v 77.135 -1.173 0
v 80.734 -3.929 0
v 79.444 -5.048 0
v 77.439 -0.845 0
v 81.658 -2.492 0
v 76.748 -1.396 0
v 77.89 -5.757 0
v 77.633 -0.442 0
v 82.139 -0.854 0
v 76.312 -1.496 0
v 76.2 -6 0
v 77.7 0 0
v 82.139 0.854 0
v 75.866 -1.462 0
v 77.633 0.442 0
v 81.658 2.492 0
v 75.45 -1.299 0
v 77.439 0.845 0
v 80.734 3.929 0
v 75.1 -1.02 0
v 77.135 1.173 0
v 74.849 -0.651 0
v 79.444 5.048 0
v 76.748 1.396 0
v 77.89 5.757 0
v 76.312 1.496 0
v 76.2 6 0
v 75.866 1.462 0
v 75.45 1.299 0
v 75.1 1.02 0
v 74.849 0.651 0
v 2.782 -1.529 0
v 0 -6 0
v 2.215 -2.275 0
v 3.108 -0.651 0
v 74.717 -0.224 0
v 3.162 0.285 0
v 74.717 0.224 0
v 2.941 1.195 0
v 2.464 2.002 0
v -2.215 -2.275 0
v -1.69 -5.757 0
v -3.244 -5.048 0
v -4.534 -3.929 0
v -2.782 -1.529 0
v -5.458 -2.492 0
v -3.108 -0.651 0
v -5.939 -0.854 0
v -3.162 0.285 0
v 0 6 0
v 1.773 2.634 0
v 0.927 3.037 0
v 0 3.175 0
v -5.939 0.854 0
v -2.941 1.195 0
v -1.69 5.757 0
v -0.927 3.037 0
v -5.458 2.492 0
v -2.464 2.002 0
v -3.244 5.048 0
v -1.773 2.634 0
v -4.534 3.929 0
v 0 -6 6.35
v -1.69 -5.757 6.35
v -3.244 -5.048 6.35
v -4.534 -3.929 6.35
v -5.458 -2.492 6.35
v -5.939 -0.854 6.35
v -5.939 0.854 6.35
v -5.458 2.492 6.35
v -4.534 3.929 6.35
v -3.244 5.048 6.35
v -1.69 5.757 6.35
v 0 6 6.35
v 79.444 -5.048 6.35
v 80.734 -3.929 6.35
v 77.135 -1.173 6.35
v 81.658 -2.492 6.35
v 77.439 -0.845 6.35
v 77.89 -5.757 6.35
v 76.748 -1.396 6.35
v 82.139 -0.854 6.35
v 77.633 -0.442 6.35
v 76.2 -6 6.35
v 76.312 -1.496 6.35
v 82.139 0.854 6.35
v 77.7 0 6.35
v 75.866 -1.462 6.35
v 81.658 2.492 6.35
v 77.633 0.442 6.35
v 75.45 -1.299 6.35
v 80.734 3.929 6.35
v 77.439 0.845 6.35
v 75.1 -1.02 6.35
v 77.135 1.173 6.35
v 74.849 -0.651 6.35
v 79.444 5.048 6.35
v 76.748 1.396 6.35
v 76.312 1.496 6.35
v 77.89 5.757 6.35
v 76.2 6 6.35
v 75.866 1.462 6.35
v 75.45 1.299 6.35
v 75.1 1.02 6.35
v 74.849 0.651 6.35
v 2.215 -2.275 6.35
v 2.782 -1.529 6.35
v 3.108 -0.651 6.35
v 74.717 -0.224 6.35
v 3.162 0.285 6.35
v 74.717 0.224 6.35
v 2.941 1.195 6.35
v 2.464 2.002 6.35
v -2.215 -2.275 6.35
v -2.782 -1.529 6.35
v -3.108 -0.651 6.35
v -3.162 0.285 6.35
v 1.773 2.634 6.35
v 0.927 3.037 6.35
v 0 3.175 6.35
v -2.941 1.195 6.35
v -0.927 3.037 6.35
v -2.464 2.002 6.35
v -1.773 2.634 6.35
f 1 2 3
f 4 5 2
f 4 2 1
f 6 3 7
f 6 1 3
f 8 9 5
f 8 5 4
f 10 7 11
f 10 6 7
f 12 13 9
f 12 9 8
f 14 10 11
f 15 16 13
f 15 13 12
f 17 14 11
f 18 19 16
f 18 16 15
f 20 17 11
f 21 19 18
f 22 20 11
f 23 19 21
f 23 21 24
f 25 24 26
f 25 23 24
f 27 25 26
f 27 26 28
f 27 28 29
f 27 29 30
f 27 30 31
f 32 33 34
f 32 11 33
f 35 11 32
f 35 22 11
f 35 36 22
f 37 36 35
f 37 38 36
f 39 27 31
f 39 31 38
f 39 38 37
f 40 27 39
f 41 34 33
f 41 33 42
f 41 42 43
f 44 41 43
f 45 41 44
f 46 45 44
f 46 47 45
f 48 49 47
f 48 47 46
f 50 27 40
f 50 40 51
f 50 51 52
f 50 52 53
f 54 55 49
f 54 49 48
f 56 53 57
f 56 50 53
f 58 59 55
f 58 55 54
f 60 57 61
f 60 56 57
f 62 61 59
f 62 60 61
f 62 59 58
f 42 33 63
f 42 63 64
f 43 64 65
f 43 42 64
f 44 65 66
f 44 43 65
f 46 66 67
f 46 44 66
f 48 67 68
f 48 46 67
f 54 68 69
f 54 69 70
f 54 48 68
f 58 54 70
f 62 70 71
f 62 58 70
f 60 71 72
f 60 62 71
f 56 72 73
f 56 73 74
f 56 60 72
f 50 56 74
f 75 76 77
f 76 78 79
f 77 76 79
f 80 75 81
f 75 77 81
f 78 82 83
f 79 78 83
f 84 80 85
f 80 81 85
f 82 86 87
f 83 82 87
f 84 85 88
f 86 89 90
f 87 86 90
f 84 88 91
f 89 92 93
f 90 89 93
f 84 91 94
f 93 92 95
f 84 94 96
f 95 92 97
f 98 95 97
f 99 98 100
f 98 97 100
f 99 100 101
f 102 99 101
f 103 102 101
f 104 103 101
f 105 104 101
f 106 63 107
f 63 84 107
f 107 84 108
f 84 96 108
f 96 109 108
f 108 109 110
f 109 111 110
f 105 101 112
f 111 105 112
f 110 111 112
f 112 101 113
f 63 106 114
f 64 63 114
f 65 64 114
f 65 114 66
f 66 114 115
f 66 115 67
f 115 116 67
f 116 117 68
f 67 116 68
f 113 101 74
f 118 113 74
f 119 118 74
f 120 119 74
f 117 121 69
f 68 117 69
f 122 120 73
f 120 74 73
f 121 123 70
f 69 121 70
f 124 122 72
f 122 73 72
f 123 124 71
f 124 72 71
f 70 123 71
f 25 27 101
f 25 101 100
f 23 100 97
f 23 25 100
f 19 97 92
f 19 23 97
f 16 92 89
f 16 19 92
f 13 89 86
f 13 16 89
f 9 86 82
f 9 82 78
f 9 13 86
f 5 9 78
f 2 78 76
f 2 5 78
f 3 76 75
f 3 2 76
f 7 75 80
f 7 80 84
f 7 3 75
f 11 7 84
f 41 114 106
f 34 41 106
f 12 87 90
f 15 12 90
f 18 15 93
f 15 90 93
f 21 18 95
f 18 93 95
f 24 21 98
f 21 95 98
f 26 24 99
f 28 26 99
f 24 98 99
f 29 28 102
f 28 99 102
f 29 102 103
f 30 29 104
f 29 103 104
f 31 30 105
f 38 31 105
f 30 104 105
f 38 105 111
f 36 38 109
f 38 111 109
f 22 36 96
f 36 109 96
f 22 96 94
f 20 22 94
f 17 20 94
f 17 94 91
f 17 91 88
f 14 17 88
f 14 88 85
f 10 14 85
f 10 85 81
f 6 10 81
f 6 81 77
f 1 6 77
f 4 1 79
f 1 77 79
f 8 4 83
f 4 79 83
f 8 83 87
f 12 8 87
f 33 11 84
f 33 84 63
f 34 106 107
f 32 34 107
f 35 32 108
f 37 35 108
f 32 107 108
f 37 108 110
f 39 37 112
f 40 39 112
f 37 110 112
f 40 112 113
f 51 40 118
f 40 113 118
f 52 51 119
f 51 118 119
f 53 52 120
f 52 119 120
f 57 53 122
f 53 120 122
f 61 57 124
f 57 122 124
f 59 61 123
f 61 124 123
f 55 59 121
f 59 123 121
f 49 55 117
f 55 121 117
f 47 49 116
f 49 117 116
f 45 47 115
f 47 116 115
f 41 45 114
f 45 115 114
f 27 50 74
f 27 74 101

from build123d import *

# Parameters (mm, degrees)
BOSS_EXTRU_1_DEPTH      = 6.35
ENL_V_MAT_EXTRU_1_REACH = 84.663
ESQUISSE3_R             = 1.5
ENL_V_MAT_EXTRU_2_DEPTH = 6.35


with BuildPart() as part:
    # Esquisse1 → Boss.-Extru.1 (new body)
    with BuildSketch(Plane.XY):
        with BuildLine():
            Line((0, 6), (76.2, 6))
            ThreePointArc((76.2, 6), (82.2, 0), (76.2, -6))
            Line((76.2, -6), (0, -6))
            ThreePointArc((0, -6), (-6, 0), (0, 6))
        make_face()
    extrude(amount=BOSS_EXTRU_1_DEPTH)

    # Esquisse2 → Enlèv. mat.-Extru.1 (cut, up to next)
    with BuildSketch(Plane.XY.offset(6.35), mode=Mode.PRIVATE) as enl_v_mat_extru_1_sk1:
        with BuildLine():
            Line((-2.214723459, -2.275), (2.214723459, -2.275))
            ThreePointArc((2.214723459, -2.275), (0, 3.175), (-2.214723459, -2.275))
        make_face()
    enl_v_mat_extru_1_tool1 = extrude(enl_v_mat_extru_1_sk1.sketch, amount=-ENL_V_MAT_EXTRU_1_REACH, mode=Mode.PRIVATE) & part.part
    add(enl_v_mat_extru_1_tool1.solids().sort_by_distance((0, 0.25037, 6.35))[0], mode=Mode.SUBTRACT)

    # Esquisse3 → Enlèv. mat.-Extru.2 (cut)
    with BuildSketch(Plane.XY.offset(6.35)):
        with Locations((76.2, 0)):
            Circle(ESQUISSE3_R)
    extrude(amount=-ENL_V_MAT_EXTRU_2_DEPTH, mode=Mode.SUBTRACT)


solid = part.part
